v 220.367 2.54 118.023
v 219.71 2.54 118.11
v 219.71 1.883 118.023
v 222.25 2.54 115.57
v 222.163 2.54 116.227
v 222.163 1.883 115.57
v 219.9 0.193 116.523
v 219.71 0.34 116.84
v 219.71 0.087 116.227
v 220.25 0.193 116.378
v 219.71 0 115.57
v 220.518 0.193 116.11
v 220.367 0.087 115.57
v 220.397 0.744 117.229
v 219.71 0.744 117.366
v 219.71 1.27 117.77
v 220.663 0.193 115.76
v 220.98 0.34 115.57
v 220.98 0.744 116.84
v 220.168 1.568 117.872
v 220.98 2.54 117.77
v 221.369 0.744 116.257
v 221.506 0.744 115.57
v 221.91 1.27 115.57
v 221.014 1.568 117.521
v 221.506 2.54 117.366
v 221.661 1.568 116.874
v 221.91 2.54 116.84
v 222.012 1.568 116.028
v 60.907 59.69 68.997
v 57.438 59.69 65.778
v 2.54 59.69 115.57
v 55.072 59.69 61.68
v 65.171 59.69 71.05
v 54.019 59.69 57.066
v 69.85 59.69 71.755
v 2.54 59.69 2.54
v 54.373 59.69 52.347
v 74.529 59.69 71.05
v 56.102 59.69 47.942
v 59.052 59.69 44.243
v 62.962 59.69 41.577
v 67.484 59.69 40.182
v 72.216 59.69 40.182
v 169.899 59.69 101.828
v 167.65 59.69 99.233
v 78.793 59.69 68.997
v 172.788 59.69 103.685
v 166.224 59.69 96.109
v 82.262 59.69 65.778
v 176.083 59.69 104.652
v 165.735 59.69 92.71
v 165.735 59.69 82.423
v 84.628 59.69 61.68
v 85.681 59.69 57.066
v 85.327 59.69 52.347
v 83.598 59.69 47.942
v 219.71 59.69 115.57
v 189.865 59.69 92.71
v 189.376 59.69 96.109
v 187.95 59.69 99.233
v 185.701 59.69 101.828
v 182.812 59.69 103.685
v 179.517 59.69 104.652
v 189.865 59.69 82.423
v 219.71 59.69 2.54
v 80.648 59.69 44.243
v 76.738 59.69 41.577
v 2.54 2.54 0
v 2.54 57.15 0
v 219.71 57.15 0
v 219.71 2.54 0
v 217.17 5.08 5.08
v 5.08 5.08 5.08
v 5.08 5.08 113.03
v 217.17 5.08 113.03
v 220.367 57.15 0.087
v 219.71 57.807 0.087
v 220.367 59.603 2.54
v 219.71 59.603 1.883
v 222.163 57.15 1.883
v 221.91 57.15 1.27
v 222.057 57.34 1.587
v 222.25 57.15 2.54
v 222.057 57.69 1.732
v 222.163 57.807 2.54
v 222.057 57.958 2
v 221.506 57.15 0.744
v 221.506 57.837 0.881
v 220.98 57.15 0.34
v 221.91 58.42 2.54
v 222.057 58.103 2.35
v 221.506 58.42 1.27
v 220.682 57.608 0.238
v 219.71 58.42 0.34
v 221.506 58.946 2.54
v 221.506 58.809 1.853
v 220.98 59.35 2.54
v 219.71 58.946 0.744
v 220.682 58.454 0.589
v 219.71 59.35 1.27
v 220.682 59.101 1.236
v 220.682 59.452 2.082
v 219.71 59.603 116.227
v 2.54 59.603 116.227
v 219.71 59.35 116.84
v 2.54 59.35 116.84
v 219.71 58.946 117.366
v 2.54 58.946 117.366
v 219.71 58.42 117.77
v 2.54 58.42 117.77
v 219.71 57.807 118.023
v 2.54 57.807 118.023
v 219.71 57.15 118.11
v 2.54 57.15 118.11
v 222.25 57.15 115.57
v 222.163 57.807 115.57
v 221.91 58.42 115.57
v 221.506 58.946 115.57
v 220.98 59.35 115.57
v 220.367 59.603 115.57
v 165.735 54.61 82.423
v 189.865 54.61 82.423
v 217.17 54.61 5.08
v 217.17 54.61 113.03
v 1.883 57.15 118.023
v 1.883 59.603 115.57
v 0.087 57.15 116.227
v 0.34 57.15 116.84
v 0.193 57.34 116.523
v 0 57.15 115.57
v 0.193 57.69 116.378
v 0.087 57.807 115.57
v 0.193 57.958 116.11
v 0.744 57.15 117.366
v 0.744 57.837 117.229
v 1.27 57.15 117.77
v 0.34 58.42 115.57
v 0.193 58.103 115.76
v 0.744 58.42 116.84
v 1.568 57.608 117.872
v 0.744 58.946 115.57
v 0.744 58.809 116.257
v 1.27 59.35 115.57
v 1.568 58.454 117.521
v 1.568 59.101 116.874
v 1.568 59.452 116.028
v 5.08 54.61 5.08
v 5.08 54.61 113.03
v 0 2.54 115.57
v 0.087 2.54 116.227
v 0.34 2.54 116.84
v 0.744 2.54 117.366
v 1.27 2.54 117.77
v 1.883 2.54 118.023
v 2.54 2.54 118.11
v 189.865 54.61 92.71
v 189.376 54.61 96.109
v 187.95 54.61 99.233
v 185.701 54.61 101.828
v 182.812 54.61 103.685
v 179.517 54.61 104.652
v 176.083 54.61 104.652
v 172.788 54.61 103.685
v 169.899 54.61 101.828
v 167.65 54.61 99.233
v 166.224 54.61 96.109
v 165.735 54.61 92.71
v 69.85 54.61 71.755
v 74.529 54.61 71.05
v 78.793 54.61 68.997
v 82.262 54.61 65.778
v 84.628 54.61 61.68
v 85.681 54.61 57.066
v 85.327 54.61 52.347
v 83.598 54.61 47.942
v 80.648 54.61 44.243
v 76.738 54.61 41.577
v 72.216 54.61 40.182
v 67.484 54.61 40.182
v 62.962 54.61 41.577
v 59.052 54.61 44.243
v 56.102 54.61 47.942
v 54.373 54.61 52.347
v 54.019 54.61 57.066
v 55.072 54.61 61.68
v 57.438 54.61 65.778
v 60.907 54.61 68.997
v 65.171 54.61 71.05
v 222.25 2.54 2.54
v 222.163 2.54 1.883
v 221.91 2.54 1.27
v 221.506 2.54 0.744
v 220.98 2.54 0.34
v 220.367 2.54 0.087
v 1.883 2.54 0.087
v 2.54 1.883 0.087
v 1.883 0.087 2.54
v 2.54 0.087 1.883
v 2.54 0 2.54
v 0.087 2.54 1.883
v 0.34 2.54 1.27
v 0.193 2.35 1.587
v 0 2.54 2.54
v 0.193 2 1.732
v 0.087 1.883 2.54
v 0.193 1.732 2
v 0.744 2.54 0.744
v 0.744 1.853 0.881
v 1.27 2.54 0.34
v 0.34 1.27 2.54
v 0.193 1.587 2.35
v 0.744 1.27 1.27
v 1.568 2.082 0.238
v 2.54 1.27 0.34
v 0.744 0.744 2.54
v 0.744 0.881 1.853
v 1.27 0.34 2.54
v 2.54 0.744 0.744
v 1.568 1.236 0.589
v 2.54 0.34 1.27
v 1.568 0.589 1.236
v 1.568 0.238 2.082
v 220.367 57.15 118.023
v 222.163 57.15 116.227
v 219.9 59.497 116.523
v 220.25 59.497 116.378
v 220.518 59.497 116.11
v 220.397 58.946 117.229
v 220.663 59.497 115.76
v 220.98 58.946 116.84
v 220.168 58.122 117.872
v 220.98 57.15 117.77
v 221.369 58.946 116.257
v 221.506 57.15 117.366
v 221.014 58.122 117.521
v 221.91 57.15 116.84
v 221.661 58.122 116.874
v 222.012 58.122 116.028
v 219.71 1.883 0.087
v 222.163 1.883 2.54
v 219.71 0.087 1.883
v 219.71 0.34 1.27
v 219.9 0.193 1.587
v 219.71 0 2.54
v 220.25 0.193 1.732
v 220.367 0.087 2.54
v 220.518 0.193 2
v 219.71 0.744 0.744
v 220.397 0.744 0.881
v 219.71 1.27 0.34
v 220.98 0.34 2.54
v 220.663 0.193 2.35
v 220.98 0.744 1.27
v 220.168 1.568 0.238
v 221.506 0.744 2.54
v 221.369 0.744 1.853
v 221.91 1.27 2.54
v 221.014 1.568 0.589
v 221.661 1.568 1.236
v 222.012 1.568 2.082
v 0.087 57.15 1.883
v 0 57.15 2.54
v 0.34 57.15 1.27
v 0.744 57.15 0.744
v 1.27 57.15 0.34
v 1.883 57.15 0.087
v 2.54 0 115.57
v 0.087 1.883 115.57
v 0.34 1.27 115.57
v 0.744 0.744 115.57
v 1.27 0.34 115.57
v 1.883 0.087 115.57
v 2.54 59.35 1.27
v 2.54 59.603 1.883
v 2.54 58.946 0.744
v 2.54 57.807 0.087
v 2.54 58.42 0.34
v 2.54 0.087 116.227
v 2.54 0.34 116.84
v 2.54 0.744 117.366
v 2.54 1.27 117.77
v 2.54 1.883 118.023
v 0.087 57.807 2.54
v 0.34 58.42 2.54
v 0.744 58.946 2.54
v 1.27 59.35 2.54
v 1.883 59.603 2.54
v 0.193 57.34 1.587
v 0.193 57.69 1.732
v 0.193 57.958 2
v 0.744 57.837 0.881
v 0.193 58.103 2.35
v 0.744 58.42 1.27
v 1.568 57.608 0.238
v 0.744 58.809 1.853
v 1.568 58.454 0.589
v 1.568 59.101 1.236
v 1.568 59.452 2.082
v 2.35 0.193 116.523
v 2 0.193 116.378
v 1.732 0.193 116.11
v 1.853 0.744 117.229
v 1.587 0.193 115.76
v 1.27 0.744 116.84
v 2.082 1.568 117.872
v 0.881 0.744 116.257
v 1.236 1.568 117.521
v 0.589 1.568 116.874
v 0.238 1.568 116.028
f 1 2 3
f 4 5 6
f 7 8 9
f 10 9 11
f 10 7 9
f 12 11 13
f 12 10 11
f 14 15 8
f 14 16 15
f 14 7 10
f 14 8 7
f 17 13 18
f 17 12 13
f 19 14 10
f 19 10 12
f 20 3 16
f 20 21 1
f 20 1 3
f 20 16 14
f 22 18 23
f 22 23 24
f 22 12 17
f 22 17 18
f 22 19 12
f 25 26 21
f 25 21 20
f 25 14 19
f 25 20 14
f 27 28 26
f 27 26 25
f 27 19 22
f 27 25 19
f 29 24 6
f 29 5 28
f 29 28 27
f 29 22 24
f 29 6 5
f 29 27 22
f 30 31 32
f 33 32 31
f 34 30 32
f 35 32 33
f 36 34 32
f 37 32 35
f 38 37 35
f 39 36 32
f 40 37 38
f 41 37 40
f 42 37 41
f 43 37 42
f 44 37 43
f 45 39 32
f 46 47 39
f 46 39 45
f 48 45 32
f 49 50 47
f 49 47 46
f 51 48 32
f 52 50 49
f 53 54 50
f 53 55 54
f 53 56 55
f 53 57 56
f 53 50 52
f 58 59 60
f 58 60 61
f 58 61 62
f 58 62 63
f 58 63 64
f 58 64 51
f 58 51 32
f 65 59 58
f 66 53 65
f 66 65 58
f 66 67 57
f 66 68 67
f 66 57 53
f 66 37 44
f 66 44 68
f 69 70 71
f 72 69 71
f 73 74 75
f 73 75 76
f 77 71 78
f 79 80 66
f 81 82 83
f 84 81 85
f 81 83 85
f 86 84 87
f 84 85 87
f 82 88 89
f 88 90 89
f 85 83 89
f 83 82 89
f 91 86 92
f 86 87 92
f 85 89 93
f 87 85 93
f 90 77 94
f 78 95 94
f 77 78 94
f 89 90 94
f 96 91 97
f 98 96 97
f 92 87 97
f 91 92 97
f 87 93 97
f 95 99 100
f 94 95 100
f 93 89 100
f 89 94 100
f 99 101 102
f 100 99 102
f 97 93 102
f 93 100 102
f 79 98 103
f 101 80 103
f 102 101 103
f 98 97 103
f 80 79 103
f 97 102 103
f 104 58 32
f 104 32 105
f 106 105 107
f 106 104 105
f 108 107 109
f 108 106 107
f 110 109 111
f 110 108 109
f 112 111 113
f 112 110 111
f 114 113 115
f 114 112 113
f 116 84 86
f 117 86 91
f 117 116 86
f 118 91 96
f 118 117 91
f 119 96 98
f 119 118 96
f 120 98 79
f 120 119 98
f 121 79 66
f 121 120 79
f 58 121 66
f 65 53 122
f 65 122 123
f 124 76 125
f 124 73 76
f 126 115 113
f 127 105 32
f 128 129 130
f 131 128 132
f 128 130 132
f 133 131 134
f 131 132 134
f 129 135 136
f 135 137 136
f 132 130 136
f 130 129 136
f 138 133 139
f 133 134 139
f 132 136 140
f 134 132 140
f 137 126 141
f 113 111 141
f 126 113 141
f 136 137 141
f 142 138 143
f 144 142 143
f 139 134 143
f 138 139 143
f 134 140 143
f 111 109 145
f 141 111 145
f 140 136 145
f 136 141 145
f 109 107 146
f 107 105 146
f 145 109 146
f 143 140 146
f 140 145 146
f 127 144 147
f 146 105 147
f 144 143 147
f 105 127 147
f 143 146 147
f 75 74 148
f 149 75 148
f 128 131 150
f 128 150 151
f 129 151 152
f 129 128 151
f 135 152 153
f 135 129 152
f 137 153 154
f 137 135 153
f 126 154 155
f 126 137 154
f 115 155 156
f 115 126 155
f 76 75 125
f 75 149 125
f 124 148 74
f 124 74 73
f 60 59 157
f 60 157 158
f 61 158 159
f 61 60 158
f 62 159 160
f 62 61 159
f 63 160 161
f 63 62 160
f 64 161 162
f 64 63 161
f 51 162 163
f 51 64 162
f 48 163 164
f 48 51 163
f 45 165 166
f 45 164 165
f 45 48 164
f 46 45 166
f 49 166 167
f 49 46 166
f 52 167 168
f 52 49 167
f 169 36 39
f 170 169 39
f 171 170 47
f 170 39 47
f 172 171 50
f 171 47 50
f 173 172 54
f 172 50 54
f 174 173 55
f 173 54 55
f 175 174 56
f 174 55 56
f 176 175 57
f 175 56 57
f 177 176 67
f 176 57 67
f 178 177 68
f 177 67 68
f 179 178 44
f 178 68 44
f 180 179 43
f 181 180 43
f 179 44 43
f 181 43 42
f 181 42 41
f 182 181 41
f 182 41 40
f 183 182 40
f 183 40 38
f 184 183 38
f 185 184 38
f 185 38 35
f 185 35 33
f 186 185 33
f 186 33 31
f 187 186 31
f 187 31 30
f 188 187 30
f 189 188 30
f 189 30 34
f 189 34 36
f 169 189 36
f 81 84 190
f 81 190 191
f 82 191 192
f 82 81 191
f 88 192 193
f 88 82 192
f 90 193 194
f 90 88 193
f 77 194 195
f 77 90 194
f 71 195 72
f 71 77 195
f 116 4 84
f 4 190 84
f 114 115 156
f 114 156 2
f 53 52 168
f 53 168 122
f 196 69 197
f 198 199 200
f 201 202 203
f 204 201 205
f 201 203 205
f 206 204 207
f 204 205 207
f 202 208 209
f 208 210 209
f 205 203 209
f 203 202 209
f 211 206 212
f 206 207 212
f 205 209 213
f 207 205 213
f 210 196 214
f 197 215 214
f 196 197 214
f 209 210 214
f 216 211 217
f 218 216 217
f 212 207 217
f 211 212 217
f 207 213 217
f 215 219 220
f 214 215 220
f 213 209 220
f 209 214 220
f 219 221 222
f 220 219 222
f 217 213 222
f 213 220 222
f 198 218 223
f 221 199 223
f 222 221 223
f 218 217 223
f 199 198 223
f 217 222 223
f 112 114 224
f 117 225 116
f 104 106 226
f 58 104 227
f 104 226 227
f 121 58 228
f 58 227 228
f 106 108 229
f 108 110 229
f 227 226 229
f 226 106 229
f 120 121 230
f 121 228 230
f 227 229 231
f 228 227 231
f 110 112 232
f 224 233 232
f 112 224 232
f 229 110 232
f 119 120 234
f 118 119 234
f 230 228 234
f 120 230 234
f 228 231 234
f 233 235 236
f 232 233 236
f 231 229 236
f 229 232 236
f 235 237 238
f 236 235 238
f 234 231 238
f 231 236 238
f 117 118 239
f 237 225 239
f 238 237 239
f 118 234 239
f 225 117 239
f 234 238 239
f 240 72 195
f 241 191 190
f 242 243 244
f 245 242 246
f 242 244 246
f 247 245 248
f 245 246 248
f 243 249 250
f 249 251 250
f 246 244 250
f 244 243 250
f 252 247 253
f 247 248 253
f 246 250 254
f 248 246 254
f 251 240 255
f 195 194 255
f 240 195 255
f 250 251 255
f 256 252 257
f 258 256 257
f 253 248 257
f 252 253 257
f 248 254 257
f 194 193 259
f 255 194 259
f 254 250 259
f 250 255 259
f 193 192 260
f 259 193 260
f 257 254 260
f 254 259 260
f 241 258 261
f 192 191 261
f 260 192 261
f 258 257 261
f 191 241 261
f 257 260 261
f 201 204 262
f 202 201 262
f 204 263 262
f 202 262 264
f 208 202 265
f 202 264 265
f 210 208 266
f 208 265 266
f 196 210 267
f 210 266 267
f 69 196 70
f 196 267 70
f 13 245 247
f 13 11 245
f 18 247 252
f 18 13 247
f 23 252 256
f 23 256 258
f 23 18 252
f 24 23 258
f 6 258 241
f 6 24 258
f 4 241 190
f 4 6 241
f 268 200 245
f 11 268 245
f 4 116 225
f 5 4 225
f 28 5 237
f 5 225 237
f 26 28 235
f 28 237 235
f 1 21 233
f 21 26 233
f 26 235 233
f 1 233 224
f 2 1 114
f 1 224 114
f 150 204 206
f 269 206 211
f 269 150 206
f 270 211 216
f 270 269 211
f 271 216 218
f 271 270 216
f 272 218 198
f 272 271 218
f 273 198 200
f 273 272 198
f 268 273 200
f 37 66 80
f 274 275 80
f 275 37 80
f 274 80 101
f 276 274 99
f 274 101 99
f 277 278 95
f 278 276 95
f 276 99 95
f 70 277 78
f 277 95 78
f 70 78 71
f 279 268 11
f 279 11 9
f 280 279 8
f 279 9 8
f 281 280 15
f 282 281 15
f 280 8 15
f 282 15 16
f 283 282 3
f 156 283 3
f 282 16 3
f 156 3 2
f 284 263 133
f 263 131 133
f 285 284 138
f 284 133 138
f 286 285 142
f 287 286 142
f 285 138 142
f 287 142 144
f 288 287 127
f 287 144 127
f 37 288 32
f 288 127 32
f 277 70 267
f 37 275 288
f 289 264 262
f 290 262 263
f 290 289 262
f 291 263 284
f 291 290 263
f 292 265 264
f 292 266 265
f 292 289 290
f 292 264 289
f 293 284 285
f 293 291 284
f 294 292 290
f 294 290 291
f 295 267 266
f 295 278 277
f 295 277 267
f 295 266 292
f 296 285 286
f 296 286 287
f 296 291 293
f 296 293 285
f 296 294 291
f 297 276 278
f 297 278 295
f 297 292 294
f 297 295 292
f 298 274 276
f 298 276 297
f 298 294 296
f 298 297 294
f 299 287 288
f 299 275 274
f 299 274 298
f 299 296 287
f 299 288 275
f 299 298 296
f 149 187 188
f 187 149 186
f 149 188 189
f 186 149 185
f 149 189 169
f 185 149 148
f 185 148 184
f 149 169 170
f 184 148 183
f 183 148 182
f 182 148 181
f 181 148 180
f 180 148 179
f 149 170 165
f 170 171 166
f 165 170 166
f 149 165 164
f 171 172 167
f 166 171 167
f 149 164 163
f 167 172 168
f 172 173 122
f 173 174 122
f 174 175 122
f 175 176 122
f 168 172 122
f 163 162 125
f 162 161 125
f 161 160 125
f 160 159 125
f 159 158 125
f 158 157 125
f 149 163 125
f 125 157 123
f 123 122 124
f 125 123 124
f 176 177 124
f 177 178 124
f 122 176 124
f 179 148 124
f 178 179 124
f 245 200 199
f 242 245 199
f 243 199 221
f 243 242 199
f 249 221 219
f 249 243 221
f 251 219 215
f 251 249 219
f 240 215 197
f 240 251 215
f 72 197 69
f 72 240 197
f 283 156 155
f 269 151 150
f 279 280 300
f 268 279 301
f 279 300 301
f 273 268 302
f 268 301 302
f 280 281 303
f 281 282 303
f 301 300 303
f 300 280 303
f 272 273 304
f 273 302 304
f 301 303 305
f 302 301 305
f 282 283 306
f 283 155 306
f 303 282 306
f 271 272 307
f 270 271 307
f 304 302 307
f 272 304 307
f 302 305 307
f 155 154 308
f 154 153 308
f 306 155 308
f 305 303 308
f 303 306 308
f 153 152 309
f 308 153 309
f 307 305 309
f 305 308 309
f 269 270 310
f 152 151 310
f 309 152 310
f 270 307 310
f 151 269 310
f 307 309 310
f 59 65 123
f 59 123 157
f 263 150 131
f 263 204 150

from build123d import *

# Parameters (mm, degrees)
SKETCH1_W           = 222.25
SKETCH1_H           = 59.69
BOSS_EXTRUDE1_DEPTH = 118.11
FILLET1_R           = 2.54
SHELL1_T            = 5.08
SKETCH2_R           = 15.875
CUT_EXTRUDE1_DEPTH  = 7.62


with BuildPart() as part:
    # Sketch1 → Boss-Extrude1 (new body)
    with BuildSketch(Plane.XY):
        with Locations((111.125, 29.845)):
            Rectangle(SKETCH1_W, SKETCH1_H)
    extrude(amount=BOSS_EXTRUDE1_DEPTH)

    # Fillet1
    fillet1_edges = [part.edges().sort_by_distance(p)[0] for p in [
        (222.25, 29.845, 118.11),
        (111.125, 59.69, 118.11),
        (0, 29.845, 118.11),
        (111.125, 59.69, 0),
        (222.25, 29.845, 0),
        (111.125, 0, 0),
        (0, 29.845, 0),
        (111.125, 0, 118.11),
        (0, 59.69, 59.055),
        (222.25, 59.69, 59.055),
        (222.25, 0, 59.055),
        (0, 0, 59.055),
    ]]
    fillet(fillet1_edges, radius=FILLET1_R)

    # Shell1 (no face opened: a closed hollow body)
    add(offset(amount=-SHELL1_T, mode=Mode.PRIVATE), mode=Mode.SUBTRACT)

    # Sketch2 → Cut-Extrude1 (cut)
    with BuildSketch(Plane(origin=(0, 59.69, 0), x_dir=(1, 0, 0), z_dir=(0, 1, 0))):
        with Locations(Location((69.85, -55.88, 0), (0, 0, 270))):  # turned: the seam where the file's is
            Circle(SKETCH2_R)
        with BuildLine():
            Line((165.735, -82.423), (189.865, -82.423))
            Line((189.865, -82.423), (189.865, -92.71))
            ThreePointArc((189.865, -92.71), (177.8, -104.775), (165.735, -92.71))
            Line((165.735, -92.71), (165.735, -82.423))
        make_face()
    extrude(amount=-CUT_EXTRUDE1_DEPTH, mode=Mode.SUBTRACT)


solid = part.part
